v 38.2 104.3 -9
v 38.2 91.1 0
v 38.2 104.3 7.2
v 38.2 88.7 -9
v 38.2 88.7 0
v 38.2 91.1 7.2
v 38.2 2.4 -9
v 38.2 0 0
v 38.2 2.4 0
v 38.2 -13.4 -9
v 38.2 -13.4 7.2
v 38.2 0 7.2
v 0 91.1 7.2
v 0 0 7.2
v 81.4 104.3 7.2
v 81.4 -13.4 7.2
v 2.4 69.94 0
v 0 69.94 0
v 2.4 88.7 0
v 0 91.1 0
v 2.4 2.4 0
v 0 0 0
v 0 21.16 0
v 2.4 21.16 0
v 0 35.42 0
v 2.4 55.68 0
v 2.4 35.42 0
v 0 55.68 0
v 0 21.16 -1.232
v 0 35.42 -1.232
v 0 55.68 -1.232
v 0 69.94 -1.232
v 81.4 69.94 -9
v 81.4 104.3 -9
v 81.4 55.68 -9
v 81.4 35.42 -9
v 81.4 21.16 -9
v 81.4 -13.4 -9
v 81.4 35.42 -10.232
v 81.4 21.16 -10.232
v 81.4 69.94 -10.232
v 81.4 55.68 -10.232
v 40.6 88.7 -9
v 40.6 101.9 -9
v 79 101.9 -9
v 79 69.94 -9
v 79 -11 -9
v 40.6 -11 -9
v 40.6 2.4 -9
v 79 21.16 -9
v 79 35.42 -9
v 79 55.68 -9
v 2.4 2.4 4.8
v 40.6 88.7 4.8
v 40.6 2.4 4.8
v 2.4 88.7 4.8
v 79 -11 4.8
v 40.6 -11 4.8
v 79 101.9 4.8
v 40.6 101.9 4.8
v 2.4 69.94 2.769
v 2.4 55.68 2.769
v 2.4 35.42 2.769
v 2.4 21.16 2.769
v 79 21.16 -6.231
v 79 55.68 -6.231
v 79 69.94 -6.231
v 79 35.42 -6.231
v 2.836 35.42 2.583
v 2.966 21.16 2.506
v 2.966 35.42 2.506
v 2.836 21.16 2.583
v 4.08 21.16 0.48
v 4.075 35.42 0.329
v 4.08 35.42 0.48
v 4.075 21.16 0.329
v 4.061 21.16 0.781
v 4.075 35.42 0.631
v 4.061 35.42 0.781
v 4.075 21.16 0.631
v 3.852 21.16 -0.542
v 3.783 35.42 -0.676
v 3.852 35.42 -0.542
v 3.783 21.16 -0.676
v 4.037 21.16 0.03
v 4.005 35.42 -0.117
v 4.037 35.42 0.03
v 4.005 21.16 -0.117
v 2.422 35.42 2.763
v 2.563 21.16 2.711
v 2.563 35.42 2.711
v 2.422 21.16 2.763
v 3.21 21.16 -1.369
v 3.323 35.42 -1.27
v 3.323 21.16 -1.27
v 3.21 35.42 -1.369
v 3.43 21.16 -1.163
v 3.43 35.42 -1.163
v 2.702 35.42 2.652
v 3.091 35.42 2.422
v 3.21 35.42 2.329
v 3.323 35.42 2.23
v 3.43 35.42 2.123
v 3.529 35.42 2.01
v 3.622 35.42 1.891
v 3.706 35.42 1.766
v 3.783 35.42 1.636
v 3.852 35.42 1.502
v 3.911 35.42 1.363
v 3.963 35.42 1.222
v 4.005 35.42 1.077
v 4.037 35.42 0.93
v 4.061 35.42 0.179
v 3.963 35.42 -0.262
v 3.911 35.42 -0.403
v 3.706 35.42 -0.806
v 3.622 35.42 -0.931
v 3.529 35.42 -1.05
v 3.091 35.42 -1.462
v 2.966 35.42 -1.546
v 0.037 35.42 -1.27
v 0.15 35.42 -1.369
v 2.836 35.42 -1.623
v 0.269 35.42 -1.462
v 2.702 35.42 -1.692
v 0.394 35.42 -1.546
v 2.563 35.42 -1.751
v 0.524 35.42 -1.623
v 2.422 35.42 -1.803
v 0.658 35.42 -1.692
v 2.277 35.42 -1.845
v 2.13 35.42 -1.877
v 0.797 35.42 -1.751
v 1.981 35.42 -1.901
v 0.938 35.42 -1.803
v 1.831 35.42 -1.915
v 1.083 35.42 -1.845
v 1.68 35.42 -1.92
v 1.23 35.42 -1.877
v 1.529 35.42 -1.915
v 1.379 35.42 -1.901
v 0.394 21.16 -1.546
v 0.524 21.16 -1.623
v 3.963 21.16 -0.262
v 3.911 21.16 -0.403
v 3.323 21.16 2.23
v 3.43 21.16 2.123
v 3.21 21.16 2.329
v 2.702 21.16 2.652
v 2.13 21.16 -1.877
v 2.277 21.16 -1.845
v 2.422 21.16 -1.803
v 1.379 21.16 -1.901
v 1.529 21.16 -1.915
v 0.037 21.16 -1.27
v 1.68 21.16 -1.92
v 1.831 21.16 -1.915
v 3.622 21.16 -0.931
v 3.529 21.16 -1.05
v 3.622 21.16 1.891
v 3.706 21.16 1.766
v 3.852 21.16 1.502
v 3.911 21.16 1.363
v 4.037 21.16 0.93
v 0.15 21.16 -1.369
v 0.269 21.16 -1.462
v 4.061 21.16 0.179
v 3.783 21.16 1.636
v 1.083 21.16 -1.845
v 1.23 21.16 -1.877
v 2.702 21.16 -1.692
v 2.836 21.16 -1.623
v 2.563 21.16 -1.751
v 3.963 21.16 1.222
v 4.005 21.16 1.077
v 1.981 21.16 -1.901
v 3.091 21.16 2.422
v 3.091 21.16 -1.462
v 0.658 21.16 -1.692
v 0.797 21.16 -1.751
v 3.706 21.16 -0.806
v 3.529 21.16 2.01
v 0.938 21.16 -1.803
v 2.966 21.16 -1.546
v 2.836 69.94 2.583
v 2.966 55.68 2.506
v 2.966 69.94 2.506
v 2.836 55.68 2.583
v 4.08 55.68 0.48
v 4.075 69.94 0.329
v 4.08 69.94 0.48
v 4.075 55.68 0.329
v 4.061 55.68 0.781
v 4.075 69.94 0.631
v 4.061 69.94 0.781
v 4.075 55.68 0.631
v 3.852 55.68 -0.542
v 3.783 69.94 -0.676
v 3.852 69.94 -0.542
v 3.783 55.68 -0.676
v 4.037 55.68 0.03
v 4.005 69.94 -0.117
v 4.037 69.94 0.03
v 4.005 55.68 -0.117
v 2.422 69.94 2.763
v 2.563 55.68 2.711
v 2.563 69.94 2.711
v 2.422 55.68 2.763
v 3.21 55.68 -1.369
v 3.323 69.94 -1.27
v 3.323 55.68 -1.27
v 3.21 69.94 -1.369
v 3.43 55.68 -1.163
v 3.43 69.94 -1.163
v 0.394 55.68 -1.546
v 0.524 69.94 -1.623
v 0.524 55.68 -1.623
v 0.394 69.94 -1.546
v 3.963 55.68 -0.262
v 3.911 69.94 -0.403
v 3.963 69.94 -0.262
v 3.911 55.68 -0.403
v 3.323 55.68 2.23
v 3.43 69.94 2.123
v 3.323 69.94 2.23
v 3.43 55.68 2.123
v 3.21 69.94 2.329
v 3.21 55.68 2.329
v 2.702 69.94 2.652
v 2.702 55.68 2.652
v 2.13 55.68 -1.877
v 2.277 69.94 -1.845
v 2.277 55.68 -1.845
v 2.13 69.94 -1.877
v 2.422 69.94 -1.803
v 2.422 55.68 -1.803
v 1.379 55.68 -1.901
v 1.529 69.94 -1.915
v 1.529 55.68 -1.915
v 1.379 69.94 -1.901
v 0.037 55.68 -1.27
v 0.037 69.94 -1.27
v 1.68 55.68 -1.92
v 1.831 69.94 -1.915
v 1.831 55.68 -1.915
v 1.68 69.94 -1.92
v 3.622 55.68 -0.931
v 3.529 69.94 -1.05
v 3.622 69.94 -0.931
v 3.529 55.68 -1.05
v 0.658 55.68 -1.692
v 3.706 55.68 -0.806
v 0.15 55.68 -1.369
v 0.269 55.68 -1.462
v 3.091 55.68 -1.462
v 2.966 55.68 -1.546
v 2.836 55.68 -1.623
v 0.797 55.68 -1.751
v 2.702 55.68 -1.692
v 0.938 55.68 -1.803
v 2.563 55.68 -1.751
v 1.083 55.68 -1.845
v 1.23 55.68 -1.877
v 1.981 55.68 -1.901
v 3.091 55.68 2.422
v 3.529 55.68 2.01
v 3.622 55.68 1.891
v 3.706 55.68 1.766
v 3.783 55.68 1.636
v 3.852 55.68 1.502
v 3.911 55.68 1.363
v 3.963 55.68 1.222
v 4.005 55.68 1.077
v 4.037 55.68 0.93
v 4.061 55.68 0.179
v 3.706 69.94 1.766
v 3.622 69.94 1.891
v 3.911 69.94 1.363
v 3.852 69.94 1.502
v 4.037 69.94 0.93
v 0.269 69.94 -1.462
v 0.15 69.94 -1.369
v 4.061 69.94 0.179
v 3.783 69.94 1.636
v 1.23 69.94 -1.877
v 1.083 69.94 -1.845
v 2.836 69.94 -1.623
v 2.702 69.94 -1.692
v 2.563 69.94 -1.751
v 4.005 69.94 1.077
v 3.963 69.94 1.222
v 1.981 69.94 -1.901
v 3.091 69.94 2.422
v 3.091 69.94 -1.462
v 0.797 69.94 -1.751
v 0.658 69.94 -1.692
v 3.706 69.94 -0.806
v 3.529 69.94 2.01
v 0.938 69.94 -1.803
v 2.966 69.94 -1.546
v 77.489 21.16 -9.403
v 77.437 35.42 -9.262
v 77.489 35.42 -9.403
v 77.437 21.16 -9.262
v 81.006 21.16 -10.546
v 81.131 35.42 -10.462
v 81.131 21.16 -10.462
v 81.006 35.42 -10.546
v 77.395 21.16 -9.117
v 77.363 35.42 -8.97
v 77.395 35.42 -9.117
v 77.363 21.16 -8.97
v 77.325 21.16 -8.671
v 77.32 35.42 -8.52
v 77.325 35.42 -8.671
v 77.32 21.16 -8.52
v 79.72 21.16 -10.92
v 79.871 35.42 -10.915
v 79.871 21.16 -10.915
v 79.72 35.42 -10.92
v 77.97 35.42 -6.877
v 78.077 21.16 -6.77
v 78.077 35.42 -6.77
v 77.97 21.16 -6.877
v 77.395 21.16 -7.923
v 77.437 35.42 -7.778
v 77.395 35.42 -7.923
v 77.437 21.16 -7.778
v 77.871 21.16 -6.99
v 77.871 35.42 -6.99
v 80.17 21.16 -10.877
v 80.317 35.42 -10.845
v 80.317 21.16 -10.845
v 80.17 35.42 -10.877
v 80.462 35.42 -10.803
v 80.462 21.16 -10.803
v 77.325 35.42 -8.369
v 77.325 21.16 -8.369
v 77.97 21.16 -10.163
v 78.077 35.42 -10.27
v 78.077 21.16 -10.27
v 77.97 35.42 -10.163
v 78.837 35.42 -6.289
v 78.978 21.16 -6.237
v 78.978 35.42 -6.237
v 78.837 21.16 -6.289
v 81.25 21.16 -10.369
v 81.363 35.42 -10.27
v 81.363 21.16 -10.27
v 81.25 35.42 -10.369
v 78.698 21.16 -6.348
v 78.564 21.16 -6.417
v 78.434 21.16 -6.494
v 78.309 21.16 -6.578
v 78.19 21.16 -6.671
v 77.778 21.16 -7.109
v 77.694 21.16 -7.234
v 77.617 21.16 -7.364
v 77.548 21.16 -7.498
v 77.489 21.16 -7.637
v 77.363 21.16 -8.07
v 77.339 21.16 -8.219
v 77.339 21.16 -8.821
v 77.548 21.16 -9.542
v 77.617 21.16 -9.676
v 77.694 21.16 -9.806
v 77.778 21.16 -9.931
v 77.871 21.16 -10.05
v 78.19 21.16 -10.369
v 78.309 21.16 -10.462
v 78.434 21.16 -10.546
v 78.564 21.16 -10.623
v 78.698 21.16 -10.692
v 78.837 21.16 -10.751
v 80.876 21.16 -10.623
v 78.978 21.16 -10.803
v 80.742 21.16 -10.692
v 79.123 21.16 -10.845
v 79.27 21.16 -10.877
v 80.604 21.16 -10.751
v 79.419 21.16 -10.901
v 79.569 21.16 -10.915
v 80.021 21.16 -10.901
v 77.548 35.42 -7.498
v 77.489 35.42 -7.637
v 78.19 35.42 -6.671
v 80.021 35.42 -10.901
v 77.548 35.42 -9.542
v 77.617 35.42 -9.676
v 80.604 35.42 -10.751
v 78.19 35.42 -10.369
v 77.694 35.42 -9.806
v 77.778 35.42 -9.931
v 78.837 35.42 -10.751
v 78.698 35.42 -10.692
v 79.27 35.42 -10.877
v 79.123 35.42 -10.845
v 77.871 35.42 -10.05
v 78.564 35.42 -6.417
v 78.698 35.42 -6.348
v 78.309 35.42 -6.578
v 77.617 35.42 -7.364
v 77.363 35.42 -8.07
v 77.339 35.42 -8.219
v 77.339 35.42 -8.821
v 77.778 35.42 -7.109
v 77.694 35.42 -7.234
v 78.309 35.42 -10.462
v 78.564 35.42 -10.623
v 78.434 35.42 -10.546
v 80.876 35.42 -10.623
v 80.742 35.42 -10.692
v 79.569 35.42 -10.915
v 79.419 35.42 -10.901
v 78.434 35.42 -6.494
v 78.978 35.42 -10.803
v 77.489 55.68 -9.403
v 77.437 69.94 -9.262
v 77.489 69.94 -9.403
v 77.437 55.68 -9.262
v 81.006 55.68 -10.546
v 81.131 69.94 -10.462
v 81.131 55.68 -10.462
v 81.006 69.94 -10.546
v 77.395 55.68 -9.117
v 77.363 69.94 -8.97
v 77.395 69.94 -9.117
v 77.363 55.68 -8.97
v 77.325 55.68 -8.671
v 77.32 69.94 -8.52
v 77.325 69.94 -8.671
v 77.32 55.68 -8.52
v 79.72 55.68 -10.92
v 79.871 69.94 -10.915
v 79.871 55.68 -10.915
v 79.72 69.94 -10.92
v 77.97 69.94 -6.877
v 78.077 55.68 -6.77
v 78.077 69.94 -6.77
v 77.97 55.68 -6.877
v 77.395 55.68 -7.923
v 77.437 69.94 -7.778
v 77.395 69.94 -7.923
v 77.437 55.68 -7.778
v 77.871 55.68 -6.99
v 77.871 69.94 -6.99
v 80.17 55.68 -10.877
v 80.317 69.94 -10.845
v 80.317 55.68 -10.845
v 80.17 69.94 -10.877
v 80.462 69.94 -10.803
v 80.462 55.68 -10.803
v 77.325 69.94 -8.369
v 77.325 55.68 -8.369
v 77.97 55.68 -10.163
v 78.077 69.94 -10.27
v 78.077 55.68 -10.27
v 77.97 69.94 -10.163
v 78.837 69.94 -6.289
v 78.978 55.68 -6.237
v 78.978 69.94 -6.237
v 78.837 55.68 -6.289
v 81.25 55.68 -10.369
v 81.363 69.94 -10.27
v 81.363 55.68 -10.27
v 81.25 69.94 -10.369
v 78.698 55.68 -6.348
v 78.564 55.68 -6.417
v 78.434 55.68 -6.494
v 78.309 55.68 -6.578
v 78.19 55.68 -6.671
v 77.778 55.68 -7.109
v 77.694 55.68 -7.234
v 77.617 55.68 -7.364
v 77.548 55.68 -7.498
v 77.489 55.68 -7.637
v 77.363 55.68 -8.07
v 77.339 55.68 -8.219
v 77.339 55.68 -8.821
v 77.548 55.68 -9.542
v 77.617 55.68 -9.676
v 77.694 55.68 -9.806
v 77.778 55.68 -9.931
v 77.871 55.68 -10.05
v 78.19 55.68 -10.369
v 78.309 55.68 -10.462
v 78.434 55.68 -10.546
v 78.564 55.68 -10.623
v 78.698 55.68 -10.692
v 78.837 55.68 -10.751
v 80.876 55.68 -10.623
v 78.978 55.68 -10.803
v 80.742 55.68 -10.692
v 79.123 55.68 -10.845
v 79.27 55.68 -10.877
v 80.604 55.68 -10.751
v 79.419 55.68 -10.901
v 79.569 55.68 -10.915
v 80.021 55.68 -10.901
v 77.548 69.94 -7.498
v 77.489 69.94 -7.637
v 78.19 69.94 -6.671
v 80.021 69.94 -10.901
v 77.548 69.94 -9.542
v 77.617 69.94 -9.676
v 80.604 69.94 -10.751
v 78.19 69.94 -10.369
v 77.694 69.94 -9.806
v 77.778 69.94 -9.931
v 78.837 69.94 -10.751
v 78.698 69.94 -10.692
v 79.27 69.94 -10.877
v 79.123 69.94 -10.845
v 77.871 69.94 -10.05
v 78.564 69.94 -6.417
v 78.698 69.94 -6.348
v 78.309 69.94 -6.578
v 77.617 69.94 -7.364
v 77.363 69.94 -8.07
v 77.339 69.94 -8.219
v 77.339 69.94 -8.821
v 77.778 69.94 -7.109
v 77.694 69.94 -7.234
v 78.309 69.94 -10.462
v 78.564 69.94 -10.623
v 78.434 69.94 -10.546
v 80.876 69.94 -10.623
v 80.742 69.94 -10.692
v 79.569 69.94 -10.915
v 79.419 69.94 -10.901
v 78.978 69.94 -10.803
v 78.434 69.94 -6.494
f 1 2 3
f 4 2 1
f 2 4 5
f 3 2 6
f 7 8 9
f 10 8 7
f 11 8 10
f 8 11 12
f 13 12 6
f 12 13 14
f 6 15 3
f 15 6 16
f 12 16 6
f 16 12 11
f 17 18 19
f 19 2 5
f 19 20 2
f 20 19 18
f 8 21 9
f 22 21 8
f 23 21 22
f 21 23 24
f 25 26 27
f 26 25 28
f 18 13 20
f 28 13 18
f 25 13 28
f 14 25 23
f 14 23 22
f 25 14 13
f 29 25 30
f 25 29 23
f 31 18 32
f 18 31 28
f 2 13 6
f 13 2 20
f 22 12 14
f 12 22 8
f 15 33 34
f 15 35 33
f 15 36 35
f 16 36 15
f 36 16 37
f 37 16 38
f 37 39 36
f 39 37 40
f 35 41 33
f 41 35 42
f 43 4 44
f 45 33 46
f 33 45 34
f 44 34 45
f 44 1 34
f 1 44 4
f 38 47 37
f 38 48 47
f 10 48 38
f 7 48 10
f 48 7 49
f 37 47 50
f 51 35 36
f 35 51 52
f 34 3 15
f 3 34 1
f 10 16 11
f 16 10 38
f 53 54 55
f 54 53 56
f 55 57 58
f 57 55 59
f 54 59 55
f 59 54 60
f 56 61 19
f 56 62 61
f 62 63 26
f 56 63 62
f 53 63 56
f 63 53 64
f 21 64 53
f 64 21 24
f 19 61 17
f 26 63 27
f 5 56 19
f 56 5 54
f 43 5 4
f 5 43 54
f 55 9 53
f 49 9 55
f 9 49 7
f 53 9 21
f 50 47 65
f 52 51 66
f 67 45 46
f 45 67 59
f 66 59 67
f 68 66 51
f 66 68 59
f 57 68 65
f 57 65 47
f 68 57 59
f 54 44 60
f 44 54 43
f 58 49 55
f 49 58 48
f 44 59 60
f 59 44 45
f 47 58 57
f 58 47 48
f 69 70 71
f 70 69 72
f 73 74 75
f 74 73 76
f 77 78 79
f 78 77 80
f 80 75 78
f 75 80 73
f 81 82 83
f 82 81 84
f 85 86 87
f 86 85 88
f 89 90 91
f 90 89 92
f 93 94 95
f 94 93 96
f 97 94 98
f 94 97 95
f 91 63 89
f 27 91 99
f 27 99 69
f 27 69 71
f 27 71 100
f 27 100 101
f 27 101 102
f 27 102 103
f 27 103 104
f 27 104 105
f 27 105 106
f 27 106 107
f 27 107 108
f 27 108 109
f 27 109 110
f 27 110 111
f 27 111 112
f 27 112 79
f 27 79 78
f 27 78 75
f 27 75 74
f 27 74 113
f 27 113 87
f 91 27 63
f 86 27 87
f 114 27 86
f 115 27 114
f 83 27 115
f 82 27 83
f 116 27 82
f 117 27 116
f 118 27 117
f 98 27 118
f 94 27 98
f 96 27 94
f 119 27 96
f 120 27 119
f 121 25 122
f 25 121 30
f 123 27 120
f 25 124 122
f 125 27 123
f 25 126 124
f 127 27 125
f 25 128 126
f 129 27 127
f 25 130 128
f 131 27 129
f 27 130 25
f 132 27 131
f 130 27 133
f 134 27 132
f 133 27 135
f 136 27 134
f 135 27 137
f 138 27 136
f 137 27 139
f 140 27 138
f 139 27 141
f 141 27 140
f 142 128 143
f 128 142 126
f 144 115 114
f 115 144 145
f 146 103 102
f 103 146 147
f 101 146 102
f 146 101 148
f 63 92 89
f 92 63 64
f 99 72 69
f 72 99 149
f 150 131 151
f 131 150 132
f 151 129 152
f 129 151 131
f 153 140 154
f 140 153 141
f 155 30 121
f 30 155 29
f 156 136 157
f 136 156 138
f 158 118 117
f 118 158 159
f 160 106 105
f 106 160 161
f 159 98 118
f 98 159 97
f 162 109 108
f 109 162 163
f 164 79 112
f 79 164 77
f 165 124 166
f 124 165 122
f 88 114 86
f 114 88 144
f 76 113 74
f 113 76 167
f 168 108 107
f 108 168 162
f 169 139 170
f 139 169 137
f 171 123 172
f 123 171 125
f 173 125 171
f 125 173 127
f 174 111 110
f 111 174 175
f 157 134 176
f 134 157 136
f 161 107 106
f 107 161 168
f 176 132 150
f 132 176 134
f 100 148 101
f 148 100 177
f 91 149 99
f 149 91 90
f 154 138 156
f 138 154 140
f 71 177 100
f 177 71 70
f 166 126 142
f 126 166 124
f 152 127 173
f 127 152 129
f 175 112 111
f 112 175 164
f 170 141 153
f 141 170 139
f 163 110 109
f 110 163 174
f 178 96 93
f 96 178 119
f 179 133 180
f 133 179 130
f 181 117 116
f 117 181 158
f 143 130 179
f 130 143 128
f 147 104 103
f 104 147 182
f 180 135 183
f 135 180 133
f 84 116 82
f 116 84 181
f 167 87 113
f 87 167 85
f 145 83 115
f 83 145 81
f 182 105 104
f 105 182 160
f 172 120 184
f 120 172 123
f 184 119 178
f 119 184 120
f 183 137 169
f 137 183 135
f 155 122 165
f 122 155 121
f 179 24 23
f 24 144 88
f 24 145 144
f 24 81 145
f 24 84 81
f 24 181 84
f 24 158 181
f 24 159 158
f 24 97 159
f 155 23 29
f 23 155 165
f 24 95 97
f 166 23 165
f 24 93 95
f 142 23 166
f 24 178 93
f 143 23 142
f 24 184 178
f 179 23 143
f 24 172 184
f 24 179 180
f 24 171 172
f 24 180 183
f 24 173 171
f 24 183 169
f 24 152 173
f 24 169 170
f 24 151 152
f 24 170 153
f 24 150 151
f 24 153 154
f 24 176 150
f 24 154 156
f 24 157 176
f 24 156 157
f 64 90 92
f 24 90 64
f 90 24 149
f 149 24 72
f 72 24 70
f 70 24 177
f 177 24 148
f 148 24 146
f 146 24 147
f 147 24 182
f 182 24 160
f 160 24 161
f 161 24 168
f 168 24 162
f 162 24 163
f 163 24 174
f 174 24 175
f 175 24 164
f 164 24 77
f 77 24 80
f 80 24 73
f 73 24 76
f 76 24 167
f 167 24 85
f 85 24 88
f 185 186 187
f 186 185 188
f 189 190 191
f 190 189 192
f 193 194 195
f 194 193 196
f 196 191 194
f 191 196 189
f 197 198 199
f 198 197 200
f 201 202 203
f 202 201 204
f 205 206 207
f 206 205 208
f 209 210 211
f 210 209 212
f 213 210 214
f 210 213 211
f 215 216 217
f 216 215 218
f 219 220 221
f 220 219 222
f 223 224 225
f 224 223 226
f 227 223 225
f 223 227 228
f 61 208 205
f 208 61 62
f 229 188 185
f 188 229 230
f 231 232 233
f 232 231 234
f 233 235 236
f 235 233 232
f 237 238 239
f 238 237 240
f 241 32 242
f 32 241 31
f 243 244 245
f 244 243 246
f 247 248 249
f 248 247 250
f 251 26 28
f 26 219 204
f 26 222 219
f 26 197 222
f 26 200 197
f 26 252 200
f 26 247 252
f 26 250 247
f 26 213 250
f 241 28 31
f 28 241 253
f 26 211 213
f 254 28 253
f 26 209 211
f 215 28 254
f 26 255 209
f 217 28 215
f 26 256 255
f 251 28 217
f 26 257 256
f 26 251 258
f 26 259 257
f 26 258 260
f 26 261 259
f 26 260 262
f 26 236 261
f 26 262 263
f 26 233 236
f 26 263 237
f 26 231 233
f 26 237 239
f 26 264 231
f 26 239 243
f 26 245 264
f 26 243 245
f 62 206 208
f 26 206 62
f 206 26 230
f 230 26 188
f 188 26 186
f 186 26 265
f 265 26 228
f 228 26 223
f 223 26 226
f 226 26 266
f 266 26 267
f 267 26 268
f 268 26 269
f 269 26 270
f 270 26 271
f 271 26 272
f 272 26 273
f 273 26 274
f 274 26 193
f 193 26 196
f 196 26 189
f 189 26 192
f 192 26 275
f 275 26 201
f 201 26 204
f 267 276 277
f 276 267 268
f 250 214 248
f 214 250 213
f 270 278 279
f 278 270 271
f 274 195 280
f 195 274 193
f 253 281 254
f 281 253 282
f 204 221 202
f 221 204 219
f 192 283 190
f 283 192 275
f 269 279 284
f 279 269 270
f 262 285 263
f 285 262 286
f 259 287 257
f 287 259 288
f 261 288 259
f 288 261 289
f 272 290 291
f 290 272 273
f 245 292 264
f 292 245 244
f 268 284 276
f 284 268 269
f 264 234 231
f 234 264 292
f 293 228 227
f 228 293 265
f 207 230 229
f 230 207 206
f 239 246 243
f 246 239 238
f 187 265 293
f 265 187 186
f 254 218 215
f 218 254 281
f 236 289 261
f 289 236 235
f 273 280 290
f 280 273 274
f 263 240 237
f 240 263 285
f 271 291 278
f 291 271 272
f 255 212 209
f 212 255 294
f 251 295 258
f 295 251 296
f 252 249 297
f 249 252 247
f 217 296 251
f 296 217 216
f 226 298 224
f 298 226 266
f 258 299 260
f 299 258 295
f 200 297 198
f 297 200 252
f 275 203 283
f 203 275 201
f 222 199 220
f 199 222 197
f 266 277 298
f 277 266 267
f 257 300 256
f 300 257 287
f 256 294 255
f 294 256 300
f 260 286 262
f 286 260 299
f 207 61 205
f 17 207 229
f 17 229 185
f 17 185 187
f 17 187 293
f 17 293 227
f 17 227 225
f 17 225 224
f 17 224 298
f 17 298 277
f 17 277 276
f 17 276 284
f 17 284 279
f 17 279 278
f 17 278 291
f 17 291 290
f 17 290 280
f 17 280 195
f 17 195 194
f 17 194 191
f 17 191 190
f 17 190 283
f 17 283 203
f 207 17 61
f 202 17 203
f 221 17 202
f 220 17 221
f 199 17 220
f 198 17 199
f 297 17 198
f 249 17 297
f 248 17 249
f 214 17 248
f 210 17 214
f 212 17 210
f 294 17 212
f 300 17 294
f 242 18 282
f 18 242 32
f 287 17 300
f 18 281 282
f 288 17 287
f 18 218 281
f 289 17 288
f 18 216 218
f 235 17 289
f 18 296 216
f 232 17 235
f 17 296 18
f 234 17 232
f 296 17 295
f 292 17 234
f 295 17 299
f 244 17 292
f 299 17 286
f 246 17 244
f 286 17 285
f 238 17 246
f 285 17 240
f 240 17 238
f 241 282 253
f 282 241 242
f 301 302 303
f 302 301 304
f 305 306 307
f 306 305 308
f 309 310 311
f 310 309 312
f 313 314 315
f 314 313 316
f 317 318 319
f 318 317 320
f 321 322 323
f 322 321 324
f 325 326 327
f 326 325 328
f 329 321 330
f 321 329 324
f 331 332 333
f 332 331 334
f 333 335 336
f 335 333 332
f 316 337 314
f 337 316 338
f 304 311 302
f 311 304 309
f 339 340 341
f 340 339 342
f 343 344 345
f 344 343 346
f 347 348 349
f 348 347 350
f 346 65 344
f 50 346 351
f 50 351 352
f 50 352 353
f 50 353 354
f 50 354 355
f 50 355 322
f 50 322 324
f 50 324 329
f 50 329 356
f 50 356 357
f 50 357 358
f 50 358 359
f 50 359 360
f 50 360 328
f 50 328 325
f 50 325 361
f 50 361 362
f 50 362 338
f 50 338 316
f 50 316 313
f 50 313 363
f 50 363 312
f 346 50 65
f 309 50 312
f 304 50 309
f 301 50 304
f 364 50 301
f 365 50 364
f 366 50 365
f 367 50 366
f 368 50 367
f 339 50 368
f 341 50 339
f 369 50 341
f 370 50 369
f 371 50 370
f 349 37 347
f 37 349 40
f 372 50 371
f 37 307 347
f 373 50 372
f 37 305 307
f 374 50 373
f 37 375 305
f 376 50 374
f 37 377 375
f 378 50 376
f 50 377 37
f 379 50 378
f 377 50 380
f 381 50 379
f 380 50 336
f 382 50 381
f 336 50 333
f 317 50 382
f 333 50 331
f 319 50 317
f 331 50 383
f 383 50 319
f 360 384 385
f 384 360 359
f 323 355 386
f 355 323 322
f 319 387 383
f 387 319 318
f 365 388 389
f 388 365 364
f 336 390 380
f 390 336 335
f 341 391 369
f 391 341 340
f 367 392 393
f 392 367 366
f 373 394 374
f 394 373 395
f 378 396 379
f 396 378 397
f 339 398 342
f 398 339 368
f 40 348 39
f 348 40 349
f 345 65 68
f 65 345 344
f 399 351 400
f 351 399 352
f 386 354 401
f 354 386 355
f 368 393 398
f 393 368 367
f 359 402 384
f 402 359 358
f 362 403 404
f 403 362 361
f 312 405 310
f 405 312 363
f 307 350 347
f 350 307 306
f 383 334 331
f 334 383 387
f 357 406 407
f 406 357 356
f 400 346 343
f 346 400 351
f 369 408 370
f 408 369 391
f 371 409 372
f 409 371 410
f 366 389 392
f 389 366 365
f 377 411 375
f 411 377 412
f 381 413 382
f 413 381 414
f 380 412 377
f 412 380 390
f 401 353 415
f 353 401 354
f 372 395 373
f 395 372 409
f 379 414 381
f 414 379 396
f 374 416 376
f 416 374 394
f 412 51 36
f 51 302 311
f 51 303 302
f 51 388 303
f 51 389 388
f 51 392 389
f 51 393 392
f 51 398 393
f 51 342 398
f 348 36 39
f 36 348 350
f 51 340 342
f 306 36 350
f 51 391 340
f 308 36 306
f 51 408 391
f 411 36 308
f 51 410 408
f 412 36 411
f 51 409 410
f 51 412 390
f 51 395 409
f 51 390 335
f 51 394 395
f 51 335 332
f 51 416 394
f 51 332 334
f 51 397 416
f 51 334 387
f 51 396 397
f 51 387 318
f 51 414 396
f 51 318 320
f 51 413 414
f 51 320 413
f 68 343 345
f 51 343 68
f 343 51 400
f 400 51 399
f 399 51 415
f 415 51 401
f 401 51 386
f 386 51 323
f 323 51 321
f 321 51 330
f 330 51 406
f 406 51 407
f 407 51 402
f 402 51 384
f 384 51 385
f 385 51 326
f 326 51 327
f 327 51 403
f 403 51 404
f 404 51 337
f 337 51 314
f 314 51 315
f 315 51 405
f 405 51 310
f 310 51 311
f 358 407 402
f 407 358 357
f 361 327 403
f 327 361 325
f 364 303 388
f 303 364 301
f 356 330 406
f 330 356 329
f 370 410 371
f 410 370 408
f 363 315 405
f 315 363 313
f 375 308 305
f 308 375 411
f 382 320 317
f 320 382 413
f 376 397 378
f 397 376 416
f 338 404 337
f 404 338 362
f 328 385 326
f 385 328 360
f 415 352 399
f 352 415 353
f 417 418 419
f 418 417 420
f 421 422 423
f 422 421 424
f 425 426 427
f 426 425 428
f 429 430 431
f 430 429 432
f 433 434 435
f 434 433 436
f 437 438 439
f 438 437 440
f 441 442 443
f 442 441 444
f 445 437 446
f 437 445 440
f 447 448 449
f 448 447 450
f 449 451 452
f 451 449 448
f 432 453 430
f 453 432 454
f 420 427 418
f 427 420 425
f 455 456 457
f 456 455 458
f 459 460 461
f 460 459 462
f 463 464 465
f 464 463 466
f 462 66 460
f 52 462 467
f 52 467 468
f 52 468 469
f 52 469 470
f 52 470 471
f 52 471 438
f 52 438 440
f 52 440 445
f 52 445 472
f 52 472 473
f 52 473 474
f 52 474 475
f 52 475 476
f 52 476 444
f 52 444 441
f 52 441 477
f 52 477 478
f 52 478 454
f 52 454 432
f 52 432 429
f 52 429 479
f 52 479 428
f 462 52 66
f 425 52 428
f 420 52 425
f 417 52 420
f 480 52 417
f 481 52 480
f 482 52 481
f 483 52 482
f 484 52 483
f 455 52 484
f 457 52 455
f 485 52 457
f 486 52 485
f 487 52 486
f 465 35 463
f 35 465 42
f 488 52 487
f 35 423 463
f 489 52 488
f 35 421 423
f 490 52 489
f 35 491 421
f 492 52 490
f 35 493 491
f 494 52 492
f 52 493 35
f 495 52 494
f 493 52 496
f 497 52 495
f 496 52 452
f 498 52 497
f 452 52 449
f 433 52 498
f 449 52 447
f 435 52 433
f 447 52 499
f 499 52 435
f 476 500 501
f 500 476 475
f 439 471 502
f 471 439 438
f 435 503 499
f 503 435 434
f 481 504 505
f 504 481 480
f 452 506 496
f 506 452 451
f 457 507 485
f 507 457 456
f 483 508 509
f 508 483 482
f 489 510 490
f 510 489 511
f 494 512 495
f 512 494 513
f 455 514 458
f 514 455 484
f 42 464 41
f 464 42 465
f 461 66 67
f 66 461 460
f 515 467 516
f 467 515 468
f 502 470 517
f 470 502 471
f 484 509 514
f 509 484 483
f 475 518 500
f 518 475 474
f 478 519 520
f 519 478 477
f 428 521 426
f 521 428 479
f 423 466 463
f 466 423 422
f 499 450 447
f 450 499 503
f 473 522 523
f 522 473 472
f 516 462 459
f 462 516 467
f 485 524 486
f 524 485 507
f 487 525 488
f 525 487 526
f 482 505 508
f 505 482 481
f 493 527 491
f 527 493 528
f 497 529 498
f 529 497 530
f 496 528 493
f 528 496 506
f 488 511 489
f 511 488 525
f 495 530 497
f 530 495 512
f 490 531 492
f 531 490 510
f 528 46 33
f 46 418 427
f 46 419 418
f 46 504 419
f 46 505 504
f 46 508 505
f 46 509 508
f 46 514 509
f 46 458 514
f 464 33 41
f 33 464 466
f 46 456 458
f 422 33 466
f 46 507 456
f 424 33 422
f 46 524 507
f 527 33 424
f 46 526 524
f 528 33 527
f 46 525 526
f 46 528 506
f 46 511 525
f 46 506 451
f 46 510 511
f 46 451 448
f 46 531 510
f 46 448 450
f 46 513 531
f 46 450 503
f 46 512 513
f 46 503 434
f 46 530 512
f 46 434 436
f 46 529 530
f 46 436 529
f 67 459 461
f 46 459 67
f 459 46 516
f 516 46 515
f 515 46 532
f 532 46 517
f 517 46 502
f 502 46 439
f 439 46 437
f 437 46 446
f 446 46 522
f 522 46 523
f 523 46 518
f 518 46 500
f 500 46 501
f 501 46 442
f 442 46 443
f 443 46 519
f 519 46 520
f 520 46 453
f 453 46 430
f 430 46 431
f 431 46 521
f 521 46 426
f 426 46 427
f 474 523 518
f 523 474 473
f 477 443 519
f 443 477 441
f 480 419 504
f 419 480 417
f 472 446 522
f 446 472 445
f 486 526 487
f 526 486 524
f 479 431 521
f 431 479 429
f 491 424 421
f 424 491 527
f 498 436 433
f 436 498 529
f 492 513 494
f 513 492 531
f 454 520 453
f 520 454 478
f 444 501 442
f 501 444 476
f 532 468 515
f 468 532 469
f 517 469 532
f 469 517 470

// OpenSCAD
// Written by xoque (mwifall@gmail.com)
/**************************************
Lid for my custom Escape holder for character meeples,
adventurer tokens, dice, chalice, ghost, gems, and quest tokens
**************************************/

Edge=5;
tol=1.5;
tol2=0.4;
Thickness=2.4;
ThicknessS=1.6;

// Dice dimensions
DiceWidth=16.5;
// Meeple dimensions
MWidth=11; 
MCutoff=9; // cutoff above meeples

// Ghost dimensions
GLength=24;
// Player token dimensions
PWidth=7.6;

// Chalice dimensions
CDiameter=20;

TLength=84.8+tol;
//TotalLength=TLength+MWidth+2*Thickness+CDiameter;
TotalLength=9*ThicknessS+7*MWidth+CDiameter+tol;
TWidth=4*Thickness+ThicknessS+2*DiceWidth+GLength+PWidth+tol;

    difference(){
        union(){
            //bottom structure
            translate([0,0,0]) {
                cube([2*DiceWidth+2*Thickness+tol2,TLength+2*Thickness,3*Thickness]); }
            translate([2*DiceWidth+2*Thickness+tol2,-Thickness-MWidth,-MCutoff]) {
                cube([GLength+4*Thickness+ThicknessS+PWidth+tol2,TotalLength+2*Thickness,3*Thickness+MCutoff]); }
            }

    //Subtraction
    //making walls
    translate([Thickness,Thickness,-MCutoff]) {
        cube([2*DiceWidth+2*ThicknessS+2*Thickness+tol2,TLength,2*Thickness+MCutoff]); }
    translate([2*DiceWidth+3*Thickness+tol2,-MWidth,-MCutoff]) {
        cube([GLength+ThicknessS+PWidth+2*Thickness+tol2,TotalLength,2*Thickness+MCutoff]); }
    }


    difference() {
        union() {
    //Snaps
            translate([Thickness*0.7,Thickness+TLength/5*2-tol,-1.5*Thickness+Thickness*1.7]) rotate([90,0,0]) cylinder($fn = 100, r = Thickness, h = TLength/5-2*tol);
            translate([Thickness*0.7,Thickness+TLength/5*4-tol,-1.5*Thickness+Thickness*1.7]) rotate([90,0,0]) cylinder($fn = 100, r = Thickness, h = TLength/5-2*tol);

    //Snaps            
            translate([2*DiceWidth+2*Thickness+GLength+4*Thickness+ThicknessS+PWidth+2*tol2-Thickness*0.7,Thickness+TLength/5*2-tol,-MCutoff-1.5*Thickness+Thickness*1.7]) rotate([90,0,0]) cylinder($fn = 100, r = Thickness, h = TLength/5-2*tol);
            translate([2*DiceWidth+2*Thickness+GLength+4*Thickness+ThicknessS+PWidth+2*tol2-Thickness*0.7,Thickness+TLength/5*4-tol,-MCutoff-1.5*Thickness+Thickness*1.7]) rotate([90,0,0]) cylinder($fn = 100, r = Thickness, h = TLength/5-2*tol);    
        }
    
    //Cutting off sides of cylinders
    translate([-Thickness,0,-Thickness]) cube([Thickness, 4*Thickness+TLength, 4*Thickness]);
    translate([2*DiceWidth+2*Thickness+GLength+4*Thickness+ThicknessS+PWidth+2*tol2,-Thickness-MWidth,-MCutoff-Thickness]) cube([Thickness, TotalLength+4*Thickness, 4*Thickness+MCutoff]);
    
    }
